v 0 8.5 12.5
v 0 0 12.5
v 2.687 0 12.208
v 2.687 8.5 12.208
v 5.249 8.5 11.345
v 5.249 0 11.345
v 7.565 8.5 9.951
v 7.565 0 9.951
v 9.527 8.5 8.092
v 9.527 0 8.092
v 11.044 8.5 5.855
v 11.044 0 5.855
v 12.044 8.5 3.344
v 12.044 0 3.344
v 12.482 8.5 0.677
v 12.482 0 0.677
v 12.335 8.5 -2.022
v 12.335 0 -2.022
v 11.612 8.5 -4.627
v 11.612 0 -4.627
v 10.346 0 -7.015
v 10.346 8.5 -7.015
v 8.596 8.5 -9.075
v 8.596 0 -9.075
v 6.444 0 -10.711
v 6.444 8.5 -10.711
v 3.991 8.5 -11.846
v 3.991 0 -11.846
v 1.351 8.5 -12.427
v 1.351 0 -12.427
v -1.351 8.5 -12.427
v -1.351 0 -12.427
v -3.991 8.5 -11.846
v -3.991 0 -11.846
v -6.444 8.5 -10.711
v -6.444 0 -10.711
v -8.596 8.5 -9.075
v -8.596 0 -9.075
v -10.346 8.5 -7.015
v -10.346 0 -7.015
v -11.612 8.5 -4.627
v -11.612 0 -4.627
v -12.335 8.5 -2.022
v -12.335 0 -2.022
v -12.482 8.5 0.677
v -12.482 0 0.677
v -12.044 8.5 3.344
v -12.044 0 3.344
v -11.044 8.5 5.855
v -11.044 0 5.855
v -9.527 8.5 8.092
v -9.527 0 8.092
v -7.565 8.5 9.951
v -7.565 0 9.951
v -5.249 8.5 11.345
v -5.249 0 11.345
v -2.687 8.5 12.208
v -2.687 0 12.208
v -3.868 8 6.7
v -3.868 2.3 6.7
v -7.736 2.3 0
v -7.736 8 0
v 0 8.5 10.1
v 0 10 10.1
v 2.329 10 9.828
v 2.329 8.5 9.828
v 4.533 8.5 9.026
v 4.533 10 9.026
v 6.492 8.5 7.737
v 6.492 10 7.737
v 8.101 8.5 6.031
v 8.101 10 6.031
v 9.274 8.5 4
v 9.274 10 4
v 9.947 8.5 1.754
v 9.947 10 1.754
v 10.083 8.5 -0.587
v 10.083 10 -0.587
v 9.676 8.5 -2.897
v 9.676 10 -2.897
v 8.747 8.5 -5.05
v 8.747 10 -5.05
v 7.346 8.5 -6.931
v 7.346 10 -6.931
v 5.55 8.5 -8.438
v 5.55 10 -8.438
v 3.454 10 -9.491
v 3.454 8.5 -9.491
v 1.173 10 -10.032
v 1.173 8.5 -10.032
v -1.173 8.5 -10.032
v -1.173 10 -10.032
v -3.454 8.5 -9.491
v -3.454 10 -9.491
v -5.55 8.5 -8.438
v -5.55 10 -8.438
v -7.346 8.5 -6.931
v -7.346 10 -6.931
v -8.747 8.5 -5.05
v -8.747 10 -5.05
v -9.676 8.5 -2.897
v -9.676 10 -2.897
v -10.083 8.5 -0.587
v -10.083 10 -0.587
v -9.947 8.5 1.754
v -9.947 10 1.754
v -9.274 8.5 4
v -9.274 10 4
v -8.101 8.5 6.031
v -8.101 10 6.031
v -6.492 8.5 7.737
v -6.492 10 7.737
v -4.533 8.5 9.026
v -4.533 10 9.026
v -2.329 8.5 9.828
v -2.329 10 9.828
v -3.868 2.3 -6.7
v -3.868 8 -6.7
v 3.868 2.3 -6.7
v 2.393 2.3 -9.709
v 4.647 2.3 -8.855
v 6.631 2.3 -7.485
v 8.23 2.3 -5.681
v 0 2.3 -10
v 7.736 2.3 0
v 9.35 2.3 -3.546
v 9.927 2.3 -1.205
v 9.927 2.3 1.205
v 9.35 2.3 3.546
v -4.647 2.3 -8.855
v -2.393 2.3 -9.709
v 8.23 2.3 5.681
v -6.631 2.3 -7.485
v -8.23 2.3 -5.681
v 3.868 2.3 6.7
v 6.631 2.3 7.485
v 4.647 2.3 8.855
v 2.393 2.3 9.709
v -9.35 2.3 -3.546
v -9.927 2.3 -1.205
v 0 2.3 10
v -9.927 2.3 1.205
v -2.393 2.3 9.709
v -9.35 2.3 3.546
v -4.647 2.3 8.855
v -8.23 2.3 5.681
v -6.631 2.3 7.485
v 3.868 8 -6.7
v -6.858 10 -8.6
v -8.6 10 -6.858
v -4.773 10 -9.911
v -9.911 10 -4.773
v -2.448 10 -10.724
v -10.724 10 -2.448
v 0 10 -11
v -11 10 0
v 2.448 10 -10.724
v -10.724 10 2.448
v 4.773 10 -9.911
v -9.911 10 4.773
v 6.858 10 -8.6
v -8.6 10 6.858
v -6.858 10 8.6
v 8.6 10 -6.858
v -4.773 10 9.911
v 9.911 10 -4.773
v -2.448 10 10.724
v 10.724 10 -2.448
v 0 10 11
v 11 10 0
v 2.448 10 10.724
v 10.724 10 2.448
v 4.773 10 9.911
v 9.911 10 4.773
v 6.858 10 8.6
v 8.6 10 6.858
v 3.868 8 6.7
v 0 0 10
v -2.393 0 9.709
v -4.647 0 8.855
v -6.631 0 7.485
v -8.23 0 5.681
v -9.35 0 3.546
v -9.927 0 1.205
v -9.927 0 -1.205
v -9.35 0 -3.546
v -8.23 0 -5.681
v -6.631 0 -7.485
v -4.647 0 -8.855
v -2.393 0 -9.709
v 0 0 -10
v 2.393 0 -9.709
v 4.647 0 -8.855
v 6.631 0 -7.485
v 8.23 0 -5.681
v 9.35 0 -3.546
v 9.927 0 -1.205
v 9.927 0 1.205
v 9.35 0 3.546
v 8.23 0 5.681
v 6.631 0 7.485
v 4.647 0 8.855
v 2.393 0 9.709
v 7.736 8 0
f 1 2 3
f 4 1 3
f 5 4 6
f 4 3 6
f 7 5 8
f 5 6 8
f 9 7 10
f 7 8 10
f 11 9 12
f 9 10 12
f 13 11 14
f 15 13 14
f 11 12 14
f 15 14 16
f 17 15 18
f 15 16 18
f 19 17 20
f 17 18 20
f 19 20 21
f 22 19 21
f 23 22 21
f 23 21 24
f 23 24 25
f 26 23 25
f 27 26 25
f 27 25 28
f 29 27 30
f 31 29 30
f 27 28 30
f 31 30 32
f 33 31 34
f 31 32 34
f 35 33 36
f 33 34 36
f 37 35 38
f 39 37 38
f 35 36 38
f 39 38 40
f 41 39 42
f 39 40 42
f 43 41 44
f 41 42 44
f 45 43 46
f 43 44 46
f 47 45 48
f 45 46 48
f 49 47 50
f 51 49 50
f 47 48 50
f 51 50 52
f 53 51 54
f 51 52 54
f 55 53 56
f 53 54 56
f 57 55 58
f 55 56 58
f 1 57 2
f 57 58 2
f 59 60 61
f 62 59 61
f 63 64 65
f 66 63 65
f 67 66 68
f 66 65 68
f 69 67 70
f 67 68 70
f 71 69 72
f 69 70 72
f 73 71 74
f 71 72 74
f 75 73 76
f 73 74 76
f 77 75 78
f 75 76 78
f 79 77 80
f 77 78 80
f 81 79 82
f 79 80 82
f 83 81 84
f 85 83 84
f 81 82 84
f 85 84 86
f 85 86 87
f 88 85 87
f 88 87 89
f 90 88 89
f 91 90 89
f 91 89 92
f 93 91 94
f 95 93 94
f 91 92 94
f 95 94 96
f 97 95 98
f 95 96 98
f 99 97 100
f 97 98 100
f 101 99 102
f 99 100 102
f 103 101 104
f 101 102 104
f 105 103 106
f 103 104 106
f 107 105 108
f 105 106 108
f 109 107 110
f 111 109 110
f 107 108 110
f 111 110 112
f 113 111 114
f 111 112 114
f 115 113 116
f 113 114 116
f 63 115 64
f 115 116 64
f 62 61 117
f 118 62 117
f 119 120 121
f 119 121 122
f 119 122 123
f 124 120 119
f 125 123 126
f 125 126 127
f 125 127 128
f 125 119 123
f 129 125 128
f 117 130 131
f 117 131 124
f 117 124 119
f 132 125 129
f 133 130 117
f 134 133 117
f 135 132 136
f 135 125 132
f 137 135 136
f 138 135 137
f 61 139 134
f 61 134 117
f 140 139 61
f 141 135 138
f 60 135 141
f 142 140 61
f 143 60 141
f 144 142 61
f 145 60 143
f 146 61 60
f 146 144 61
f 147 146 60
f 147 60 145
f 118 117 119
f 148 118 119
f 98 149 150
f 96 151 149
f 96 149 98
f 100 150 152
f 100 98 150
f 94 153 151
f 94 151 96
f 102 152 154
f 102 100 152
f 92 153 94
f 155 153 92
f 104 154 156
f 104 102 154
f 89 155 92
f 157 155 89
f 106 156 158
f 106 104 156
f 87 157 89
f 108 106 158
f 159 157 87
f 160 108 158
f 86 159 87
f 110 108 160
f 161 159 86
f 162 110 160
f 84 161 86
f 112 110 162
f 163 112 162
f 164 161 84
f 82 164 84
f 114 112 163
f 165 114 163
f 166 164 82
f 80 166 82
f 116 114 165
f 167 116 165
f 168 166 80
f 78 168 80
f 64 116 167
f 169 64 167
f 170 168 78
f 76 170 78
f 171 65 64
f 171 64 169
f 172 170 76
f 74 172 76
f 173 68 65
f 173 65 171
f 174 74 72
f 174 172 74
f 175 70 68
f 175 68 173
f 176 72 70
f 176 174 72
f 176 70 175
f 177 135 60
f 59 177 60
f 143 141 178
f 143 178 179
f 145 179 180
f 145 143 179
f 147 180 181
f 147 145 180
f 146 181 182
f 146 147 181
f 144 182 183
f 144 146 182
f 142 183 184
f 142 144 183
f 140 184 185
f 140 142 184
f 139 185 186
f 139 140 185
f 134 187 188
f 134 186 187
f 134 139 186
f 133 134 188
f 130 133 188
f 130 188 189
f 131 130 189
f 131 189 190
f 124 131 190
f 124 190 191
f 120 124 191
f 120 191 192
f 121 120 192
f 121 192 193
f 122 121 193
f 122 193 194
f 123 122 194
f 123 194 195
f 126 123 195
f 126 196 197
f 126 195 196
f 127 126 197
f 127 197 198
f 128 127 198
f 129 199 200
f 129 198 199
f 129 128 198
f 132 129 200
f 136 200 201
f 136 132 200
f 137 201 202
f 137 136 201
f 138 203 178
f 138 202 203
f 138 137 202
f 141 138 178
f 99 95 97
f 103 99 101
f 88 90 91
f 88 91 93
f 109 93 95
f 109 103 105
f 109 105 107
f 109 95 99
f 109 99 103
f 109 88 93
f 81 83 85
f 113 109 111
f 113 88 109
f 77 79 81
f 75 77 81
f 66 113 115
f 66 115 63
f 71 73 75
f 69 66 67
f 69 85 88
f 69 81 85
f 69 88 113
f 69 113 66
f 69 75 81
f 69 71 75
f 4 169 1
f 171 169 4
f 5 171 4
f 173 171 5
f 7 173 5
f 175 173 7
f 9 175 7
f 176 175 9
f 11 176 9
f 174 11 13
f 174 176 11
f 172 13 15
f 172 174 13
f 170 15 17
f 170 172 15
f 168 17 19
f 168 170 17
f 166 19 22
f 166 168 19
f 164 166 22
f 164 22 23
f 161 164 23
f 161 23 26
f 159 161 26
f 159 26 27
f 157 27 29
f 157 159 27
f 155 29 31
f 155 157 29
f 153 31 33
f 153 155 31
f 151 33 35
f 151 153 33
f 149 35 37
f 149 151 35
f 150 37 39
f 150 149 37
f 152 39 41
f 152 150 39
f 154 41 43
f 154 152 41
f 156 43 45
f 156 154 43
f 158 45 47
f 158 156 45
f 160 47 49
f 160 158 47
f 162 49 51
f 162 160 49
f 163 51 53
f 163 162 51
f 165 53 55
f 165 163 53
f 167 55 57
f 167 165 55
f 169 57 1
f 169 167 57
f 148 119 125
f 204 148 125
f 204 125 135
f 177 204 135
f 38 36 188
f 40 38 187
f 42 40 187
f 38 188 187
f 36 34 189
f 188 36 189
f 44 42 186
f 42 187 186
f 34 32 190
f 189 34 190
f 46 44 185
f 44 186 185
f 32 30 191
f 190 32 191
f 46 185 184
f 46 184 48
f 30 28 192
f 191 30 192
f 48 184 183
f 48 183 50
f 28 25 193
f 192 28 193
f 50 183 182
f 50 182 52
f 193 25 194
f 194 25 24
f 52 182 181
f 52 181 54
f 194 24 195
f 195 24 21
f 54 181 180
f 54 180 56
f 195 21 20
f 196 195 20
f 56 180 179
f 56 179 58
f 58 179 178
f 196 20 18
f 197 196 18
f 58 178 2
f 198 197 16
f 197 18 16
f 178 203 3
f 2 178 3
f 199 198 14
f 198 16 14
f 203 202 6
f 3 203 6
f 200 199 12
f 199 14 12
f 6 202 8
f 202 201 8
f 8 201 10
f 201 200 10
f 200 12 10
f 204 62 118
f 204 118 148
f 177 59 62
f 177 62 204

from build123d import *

# Parameters (mm, degrees)
SKETCH1_R           = 12.5
BOSS_EXTRUDE1_DEPTH = 10
CUT_EXTRUDE1_DEPTH  = 8
CHAMFER1_SIZE       = 1.5
SKETCH5_R           = 10
CUT_EXTRUDE2_DEPTH  = 6
SKETCH6_R           = 10.1
CUT_EXTRUDE3_DEPTH  = 1.5


with BuildPart() as part:
    # Sketch1 → Boss-Extrude1 (new body)
    with BuildSketch(Plane(origin=(0, 0, 0), x_dir=(1, 0, 0), z_dir=(0, 1, 0))):
        with Locations(Location((0, 0, 0), (0, 0, 270))):
            Circle(SKETCH1_R)
    extrude(amount=BOSS_EXTRUDE1_DEPTH)

    # Sketch2 → Cut-Extrude1 (cut)
    with BuildSketch(Plane.XZ):
        Polygon((7.736493607, 0), (3.868246804, 6.7), (-3.868246804, 6.7), (-7.736493607, 0), (-3.868246804, -6.7), (3.868246804, -6.7), align=None)
    extrude(amount=-CUT_EXTRUDE1_DEPTH, mode=Mode.SUBTRACT)

    # Chamfer1
    chamfer1_edges = [part.edges().sort_by_distance(p)[0] for p in [
        (0, 10, -12.5),
    ]]
    chamfer(chamfer1_edges, length=CHAMFER1_SIZE)

    # Sketch5 → Cut-Extrude2 (cut)
    with BuildSketch(Plane(origin=(0, 2.3, 0), x_dir=(-1, 0, 0), z_dir=(0, -1, 0))):
        with Locations(Location((0, 0, 0), (0, 0, 270))):
            Circle(SKETCH5_R)
    extrude(amount=CUT_EXTRUDE2_DEPTH, mode=Mode.SUBTRACT)

    # Sketch6 → Cut-Extrude3 (cut)
    with BuildSketch(Plane(origin=(0, 10, 0), x_dir=(1, 0, 0), z_dir=(0, 1, 0))):
        with Locations(Location((0, 0, 0), (0, 0, 270))):
            Circle(SKETCH6_R)
    extrude(amount=-CUT_EXTRUDE3_DEPTH, mode=Mode.SUBTRACT)


solid = part.part
